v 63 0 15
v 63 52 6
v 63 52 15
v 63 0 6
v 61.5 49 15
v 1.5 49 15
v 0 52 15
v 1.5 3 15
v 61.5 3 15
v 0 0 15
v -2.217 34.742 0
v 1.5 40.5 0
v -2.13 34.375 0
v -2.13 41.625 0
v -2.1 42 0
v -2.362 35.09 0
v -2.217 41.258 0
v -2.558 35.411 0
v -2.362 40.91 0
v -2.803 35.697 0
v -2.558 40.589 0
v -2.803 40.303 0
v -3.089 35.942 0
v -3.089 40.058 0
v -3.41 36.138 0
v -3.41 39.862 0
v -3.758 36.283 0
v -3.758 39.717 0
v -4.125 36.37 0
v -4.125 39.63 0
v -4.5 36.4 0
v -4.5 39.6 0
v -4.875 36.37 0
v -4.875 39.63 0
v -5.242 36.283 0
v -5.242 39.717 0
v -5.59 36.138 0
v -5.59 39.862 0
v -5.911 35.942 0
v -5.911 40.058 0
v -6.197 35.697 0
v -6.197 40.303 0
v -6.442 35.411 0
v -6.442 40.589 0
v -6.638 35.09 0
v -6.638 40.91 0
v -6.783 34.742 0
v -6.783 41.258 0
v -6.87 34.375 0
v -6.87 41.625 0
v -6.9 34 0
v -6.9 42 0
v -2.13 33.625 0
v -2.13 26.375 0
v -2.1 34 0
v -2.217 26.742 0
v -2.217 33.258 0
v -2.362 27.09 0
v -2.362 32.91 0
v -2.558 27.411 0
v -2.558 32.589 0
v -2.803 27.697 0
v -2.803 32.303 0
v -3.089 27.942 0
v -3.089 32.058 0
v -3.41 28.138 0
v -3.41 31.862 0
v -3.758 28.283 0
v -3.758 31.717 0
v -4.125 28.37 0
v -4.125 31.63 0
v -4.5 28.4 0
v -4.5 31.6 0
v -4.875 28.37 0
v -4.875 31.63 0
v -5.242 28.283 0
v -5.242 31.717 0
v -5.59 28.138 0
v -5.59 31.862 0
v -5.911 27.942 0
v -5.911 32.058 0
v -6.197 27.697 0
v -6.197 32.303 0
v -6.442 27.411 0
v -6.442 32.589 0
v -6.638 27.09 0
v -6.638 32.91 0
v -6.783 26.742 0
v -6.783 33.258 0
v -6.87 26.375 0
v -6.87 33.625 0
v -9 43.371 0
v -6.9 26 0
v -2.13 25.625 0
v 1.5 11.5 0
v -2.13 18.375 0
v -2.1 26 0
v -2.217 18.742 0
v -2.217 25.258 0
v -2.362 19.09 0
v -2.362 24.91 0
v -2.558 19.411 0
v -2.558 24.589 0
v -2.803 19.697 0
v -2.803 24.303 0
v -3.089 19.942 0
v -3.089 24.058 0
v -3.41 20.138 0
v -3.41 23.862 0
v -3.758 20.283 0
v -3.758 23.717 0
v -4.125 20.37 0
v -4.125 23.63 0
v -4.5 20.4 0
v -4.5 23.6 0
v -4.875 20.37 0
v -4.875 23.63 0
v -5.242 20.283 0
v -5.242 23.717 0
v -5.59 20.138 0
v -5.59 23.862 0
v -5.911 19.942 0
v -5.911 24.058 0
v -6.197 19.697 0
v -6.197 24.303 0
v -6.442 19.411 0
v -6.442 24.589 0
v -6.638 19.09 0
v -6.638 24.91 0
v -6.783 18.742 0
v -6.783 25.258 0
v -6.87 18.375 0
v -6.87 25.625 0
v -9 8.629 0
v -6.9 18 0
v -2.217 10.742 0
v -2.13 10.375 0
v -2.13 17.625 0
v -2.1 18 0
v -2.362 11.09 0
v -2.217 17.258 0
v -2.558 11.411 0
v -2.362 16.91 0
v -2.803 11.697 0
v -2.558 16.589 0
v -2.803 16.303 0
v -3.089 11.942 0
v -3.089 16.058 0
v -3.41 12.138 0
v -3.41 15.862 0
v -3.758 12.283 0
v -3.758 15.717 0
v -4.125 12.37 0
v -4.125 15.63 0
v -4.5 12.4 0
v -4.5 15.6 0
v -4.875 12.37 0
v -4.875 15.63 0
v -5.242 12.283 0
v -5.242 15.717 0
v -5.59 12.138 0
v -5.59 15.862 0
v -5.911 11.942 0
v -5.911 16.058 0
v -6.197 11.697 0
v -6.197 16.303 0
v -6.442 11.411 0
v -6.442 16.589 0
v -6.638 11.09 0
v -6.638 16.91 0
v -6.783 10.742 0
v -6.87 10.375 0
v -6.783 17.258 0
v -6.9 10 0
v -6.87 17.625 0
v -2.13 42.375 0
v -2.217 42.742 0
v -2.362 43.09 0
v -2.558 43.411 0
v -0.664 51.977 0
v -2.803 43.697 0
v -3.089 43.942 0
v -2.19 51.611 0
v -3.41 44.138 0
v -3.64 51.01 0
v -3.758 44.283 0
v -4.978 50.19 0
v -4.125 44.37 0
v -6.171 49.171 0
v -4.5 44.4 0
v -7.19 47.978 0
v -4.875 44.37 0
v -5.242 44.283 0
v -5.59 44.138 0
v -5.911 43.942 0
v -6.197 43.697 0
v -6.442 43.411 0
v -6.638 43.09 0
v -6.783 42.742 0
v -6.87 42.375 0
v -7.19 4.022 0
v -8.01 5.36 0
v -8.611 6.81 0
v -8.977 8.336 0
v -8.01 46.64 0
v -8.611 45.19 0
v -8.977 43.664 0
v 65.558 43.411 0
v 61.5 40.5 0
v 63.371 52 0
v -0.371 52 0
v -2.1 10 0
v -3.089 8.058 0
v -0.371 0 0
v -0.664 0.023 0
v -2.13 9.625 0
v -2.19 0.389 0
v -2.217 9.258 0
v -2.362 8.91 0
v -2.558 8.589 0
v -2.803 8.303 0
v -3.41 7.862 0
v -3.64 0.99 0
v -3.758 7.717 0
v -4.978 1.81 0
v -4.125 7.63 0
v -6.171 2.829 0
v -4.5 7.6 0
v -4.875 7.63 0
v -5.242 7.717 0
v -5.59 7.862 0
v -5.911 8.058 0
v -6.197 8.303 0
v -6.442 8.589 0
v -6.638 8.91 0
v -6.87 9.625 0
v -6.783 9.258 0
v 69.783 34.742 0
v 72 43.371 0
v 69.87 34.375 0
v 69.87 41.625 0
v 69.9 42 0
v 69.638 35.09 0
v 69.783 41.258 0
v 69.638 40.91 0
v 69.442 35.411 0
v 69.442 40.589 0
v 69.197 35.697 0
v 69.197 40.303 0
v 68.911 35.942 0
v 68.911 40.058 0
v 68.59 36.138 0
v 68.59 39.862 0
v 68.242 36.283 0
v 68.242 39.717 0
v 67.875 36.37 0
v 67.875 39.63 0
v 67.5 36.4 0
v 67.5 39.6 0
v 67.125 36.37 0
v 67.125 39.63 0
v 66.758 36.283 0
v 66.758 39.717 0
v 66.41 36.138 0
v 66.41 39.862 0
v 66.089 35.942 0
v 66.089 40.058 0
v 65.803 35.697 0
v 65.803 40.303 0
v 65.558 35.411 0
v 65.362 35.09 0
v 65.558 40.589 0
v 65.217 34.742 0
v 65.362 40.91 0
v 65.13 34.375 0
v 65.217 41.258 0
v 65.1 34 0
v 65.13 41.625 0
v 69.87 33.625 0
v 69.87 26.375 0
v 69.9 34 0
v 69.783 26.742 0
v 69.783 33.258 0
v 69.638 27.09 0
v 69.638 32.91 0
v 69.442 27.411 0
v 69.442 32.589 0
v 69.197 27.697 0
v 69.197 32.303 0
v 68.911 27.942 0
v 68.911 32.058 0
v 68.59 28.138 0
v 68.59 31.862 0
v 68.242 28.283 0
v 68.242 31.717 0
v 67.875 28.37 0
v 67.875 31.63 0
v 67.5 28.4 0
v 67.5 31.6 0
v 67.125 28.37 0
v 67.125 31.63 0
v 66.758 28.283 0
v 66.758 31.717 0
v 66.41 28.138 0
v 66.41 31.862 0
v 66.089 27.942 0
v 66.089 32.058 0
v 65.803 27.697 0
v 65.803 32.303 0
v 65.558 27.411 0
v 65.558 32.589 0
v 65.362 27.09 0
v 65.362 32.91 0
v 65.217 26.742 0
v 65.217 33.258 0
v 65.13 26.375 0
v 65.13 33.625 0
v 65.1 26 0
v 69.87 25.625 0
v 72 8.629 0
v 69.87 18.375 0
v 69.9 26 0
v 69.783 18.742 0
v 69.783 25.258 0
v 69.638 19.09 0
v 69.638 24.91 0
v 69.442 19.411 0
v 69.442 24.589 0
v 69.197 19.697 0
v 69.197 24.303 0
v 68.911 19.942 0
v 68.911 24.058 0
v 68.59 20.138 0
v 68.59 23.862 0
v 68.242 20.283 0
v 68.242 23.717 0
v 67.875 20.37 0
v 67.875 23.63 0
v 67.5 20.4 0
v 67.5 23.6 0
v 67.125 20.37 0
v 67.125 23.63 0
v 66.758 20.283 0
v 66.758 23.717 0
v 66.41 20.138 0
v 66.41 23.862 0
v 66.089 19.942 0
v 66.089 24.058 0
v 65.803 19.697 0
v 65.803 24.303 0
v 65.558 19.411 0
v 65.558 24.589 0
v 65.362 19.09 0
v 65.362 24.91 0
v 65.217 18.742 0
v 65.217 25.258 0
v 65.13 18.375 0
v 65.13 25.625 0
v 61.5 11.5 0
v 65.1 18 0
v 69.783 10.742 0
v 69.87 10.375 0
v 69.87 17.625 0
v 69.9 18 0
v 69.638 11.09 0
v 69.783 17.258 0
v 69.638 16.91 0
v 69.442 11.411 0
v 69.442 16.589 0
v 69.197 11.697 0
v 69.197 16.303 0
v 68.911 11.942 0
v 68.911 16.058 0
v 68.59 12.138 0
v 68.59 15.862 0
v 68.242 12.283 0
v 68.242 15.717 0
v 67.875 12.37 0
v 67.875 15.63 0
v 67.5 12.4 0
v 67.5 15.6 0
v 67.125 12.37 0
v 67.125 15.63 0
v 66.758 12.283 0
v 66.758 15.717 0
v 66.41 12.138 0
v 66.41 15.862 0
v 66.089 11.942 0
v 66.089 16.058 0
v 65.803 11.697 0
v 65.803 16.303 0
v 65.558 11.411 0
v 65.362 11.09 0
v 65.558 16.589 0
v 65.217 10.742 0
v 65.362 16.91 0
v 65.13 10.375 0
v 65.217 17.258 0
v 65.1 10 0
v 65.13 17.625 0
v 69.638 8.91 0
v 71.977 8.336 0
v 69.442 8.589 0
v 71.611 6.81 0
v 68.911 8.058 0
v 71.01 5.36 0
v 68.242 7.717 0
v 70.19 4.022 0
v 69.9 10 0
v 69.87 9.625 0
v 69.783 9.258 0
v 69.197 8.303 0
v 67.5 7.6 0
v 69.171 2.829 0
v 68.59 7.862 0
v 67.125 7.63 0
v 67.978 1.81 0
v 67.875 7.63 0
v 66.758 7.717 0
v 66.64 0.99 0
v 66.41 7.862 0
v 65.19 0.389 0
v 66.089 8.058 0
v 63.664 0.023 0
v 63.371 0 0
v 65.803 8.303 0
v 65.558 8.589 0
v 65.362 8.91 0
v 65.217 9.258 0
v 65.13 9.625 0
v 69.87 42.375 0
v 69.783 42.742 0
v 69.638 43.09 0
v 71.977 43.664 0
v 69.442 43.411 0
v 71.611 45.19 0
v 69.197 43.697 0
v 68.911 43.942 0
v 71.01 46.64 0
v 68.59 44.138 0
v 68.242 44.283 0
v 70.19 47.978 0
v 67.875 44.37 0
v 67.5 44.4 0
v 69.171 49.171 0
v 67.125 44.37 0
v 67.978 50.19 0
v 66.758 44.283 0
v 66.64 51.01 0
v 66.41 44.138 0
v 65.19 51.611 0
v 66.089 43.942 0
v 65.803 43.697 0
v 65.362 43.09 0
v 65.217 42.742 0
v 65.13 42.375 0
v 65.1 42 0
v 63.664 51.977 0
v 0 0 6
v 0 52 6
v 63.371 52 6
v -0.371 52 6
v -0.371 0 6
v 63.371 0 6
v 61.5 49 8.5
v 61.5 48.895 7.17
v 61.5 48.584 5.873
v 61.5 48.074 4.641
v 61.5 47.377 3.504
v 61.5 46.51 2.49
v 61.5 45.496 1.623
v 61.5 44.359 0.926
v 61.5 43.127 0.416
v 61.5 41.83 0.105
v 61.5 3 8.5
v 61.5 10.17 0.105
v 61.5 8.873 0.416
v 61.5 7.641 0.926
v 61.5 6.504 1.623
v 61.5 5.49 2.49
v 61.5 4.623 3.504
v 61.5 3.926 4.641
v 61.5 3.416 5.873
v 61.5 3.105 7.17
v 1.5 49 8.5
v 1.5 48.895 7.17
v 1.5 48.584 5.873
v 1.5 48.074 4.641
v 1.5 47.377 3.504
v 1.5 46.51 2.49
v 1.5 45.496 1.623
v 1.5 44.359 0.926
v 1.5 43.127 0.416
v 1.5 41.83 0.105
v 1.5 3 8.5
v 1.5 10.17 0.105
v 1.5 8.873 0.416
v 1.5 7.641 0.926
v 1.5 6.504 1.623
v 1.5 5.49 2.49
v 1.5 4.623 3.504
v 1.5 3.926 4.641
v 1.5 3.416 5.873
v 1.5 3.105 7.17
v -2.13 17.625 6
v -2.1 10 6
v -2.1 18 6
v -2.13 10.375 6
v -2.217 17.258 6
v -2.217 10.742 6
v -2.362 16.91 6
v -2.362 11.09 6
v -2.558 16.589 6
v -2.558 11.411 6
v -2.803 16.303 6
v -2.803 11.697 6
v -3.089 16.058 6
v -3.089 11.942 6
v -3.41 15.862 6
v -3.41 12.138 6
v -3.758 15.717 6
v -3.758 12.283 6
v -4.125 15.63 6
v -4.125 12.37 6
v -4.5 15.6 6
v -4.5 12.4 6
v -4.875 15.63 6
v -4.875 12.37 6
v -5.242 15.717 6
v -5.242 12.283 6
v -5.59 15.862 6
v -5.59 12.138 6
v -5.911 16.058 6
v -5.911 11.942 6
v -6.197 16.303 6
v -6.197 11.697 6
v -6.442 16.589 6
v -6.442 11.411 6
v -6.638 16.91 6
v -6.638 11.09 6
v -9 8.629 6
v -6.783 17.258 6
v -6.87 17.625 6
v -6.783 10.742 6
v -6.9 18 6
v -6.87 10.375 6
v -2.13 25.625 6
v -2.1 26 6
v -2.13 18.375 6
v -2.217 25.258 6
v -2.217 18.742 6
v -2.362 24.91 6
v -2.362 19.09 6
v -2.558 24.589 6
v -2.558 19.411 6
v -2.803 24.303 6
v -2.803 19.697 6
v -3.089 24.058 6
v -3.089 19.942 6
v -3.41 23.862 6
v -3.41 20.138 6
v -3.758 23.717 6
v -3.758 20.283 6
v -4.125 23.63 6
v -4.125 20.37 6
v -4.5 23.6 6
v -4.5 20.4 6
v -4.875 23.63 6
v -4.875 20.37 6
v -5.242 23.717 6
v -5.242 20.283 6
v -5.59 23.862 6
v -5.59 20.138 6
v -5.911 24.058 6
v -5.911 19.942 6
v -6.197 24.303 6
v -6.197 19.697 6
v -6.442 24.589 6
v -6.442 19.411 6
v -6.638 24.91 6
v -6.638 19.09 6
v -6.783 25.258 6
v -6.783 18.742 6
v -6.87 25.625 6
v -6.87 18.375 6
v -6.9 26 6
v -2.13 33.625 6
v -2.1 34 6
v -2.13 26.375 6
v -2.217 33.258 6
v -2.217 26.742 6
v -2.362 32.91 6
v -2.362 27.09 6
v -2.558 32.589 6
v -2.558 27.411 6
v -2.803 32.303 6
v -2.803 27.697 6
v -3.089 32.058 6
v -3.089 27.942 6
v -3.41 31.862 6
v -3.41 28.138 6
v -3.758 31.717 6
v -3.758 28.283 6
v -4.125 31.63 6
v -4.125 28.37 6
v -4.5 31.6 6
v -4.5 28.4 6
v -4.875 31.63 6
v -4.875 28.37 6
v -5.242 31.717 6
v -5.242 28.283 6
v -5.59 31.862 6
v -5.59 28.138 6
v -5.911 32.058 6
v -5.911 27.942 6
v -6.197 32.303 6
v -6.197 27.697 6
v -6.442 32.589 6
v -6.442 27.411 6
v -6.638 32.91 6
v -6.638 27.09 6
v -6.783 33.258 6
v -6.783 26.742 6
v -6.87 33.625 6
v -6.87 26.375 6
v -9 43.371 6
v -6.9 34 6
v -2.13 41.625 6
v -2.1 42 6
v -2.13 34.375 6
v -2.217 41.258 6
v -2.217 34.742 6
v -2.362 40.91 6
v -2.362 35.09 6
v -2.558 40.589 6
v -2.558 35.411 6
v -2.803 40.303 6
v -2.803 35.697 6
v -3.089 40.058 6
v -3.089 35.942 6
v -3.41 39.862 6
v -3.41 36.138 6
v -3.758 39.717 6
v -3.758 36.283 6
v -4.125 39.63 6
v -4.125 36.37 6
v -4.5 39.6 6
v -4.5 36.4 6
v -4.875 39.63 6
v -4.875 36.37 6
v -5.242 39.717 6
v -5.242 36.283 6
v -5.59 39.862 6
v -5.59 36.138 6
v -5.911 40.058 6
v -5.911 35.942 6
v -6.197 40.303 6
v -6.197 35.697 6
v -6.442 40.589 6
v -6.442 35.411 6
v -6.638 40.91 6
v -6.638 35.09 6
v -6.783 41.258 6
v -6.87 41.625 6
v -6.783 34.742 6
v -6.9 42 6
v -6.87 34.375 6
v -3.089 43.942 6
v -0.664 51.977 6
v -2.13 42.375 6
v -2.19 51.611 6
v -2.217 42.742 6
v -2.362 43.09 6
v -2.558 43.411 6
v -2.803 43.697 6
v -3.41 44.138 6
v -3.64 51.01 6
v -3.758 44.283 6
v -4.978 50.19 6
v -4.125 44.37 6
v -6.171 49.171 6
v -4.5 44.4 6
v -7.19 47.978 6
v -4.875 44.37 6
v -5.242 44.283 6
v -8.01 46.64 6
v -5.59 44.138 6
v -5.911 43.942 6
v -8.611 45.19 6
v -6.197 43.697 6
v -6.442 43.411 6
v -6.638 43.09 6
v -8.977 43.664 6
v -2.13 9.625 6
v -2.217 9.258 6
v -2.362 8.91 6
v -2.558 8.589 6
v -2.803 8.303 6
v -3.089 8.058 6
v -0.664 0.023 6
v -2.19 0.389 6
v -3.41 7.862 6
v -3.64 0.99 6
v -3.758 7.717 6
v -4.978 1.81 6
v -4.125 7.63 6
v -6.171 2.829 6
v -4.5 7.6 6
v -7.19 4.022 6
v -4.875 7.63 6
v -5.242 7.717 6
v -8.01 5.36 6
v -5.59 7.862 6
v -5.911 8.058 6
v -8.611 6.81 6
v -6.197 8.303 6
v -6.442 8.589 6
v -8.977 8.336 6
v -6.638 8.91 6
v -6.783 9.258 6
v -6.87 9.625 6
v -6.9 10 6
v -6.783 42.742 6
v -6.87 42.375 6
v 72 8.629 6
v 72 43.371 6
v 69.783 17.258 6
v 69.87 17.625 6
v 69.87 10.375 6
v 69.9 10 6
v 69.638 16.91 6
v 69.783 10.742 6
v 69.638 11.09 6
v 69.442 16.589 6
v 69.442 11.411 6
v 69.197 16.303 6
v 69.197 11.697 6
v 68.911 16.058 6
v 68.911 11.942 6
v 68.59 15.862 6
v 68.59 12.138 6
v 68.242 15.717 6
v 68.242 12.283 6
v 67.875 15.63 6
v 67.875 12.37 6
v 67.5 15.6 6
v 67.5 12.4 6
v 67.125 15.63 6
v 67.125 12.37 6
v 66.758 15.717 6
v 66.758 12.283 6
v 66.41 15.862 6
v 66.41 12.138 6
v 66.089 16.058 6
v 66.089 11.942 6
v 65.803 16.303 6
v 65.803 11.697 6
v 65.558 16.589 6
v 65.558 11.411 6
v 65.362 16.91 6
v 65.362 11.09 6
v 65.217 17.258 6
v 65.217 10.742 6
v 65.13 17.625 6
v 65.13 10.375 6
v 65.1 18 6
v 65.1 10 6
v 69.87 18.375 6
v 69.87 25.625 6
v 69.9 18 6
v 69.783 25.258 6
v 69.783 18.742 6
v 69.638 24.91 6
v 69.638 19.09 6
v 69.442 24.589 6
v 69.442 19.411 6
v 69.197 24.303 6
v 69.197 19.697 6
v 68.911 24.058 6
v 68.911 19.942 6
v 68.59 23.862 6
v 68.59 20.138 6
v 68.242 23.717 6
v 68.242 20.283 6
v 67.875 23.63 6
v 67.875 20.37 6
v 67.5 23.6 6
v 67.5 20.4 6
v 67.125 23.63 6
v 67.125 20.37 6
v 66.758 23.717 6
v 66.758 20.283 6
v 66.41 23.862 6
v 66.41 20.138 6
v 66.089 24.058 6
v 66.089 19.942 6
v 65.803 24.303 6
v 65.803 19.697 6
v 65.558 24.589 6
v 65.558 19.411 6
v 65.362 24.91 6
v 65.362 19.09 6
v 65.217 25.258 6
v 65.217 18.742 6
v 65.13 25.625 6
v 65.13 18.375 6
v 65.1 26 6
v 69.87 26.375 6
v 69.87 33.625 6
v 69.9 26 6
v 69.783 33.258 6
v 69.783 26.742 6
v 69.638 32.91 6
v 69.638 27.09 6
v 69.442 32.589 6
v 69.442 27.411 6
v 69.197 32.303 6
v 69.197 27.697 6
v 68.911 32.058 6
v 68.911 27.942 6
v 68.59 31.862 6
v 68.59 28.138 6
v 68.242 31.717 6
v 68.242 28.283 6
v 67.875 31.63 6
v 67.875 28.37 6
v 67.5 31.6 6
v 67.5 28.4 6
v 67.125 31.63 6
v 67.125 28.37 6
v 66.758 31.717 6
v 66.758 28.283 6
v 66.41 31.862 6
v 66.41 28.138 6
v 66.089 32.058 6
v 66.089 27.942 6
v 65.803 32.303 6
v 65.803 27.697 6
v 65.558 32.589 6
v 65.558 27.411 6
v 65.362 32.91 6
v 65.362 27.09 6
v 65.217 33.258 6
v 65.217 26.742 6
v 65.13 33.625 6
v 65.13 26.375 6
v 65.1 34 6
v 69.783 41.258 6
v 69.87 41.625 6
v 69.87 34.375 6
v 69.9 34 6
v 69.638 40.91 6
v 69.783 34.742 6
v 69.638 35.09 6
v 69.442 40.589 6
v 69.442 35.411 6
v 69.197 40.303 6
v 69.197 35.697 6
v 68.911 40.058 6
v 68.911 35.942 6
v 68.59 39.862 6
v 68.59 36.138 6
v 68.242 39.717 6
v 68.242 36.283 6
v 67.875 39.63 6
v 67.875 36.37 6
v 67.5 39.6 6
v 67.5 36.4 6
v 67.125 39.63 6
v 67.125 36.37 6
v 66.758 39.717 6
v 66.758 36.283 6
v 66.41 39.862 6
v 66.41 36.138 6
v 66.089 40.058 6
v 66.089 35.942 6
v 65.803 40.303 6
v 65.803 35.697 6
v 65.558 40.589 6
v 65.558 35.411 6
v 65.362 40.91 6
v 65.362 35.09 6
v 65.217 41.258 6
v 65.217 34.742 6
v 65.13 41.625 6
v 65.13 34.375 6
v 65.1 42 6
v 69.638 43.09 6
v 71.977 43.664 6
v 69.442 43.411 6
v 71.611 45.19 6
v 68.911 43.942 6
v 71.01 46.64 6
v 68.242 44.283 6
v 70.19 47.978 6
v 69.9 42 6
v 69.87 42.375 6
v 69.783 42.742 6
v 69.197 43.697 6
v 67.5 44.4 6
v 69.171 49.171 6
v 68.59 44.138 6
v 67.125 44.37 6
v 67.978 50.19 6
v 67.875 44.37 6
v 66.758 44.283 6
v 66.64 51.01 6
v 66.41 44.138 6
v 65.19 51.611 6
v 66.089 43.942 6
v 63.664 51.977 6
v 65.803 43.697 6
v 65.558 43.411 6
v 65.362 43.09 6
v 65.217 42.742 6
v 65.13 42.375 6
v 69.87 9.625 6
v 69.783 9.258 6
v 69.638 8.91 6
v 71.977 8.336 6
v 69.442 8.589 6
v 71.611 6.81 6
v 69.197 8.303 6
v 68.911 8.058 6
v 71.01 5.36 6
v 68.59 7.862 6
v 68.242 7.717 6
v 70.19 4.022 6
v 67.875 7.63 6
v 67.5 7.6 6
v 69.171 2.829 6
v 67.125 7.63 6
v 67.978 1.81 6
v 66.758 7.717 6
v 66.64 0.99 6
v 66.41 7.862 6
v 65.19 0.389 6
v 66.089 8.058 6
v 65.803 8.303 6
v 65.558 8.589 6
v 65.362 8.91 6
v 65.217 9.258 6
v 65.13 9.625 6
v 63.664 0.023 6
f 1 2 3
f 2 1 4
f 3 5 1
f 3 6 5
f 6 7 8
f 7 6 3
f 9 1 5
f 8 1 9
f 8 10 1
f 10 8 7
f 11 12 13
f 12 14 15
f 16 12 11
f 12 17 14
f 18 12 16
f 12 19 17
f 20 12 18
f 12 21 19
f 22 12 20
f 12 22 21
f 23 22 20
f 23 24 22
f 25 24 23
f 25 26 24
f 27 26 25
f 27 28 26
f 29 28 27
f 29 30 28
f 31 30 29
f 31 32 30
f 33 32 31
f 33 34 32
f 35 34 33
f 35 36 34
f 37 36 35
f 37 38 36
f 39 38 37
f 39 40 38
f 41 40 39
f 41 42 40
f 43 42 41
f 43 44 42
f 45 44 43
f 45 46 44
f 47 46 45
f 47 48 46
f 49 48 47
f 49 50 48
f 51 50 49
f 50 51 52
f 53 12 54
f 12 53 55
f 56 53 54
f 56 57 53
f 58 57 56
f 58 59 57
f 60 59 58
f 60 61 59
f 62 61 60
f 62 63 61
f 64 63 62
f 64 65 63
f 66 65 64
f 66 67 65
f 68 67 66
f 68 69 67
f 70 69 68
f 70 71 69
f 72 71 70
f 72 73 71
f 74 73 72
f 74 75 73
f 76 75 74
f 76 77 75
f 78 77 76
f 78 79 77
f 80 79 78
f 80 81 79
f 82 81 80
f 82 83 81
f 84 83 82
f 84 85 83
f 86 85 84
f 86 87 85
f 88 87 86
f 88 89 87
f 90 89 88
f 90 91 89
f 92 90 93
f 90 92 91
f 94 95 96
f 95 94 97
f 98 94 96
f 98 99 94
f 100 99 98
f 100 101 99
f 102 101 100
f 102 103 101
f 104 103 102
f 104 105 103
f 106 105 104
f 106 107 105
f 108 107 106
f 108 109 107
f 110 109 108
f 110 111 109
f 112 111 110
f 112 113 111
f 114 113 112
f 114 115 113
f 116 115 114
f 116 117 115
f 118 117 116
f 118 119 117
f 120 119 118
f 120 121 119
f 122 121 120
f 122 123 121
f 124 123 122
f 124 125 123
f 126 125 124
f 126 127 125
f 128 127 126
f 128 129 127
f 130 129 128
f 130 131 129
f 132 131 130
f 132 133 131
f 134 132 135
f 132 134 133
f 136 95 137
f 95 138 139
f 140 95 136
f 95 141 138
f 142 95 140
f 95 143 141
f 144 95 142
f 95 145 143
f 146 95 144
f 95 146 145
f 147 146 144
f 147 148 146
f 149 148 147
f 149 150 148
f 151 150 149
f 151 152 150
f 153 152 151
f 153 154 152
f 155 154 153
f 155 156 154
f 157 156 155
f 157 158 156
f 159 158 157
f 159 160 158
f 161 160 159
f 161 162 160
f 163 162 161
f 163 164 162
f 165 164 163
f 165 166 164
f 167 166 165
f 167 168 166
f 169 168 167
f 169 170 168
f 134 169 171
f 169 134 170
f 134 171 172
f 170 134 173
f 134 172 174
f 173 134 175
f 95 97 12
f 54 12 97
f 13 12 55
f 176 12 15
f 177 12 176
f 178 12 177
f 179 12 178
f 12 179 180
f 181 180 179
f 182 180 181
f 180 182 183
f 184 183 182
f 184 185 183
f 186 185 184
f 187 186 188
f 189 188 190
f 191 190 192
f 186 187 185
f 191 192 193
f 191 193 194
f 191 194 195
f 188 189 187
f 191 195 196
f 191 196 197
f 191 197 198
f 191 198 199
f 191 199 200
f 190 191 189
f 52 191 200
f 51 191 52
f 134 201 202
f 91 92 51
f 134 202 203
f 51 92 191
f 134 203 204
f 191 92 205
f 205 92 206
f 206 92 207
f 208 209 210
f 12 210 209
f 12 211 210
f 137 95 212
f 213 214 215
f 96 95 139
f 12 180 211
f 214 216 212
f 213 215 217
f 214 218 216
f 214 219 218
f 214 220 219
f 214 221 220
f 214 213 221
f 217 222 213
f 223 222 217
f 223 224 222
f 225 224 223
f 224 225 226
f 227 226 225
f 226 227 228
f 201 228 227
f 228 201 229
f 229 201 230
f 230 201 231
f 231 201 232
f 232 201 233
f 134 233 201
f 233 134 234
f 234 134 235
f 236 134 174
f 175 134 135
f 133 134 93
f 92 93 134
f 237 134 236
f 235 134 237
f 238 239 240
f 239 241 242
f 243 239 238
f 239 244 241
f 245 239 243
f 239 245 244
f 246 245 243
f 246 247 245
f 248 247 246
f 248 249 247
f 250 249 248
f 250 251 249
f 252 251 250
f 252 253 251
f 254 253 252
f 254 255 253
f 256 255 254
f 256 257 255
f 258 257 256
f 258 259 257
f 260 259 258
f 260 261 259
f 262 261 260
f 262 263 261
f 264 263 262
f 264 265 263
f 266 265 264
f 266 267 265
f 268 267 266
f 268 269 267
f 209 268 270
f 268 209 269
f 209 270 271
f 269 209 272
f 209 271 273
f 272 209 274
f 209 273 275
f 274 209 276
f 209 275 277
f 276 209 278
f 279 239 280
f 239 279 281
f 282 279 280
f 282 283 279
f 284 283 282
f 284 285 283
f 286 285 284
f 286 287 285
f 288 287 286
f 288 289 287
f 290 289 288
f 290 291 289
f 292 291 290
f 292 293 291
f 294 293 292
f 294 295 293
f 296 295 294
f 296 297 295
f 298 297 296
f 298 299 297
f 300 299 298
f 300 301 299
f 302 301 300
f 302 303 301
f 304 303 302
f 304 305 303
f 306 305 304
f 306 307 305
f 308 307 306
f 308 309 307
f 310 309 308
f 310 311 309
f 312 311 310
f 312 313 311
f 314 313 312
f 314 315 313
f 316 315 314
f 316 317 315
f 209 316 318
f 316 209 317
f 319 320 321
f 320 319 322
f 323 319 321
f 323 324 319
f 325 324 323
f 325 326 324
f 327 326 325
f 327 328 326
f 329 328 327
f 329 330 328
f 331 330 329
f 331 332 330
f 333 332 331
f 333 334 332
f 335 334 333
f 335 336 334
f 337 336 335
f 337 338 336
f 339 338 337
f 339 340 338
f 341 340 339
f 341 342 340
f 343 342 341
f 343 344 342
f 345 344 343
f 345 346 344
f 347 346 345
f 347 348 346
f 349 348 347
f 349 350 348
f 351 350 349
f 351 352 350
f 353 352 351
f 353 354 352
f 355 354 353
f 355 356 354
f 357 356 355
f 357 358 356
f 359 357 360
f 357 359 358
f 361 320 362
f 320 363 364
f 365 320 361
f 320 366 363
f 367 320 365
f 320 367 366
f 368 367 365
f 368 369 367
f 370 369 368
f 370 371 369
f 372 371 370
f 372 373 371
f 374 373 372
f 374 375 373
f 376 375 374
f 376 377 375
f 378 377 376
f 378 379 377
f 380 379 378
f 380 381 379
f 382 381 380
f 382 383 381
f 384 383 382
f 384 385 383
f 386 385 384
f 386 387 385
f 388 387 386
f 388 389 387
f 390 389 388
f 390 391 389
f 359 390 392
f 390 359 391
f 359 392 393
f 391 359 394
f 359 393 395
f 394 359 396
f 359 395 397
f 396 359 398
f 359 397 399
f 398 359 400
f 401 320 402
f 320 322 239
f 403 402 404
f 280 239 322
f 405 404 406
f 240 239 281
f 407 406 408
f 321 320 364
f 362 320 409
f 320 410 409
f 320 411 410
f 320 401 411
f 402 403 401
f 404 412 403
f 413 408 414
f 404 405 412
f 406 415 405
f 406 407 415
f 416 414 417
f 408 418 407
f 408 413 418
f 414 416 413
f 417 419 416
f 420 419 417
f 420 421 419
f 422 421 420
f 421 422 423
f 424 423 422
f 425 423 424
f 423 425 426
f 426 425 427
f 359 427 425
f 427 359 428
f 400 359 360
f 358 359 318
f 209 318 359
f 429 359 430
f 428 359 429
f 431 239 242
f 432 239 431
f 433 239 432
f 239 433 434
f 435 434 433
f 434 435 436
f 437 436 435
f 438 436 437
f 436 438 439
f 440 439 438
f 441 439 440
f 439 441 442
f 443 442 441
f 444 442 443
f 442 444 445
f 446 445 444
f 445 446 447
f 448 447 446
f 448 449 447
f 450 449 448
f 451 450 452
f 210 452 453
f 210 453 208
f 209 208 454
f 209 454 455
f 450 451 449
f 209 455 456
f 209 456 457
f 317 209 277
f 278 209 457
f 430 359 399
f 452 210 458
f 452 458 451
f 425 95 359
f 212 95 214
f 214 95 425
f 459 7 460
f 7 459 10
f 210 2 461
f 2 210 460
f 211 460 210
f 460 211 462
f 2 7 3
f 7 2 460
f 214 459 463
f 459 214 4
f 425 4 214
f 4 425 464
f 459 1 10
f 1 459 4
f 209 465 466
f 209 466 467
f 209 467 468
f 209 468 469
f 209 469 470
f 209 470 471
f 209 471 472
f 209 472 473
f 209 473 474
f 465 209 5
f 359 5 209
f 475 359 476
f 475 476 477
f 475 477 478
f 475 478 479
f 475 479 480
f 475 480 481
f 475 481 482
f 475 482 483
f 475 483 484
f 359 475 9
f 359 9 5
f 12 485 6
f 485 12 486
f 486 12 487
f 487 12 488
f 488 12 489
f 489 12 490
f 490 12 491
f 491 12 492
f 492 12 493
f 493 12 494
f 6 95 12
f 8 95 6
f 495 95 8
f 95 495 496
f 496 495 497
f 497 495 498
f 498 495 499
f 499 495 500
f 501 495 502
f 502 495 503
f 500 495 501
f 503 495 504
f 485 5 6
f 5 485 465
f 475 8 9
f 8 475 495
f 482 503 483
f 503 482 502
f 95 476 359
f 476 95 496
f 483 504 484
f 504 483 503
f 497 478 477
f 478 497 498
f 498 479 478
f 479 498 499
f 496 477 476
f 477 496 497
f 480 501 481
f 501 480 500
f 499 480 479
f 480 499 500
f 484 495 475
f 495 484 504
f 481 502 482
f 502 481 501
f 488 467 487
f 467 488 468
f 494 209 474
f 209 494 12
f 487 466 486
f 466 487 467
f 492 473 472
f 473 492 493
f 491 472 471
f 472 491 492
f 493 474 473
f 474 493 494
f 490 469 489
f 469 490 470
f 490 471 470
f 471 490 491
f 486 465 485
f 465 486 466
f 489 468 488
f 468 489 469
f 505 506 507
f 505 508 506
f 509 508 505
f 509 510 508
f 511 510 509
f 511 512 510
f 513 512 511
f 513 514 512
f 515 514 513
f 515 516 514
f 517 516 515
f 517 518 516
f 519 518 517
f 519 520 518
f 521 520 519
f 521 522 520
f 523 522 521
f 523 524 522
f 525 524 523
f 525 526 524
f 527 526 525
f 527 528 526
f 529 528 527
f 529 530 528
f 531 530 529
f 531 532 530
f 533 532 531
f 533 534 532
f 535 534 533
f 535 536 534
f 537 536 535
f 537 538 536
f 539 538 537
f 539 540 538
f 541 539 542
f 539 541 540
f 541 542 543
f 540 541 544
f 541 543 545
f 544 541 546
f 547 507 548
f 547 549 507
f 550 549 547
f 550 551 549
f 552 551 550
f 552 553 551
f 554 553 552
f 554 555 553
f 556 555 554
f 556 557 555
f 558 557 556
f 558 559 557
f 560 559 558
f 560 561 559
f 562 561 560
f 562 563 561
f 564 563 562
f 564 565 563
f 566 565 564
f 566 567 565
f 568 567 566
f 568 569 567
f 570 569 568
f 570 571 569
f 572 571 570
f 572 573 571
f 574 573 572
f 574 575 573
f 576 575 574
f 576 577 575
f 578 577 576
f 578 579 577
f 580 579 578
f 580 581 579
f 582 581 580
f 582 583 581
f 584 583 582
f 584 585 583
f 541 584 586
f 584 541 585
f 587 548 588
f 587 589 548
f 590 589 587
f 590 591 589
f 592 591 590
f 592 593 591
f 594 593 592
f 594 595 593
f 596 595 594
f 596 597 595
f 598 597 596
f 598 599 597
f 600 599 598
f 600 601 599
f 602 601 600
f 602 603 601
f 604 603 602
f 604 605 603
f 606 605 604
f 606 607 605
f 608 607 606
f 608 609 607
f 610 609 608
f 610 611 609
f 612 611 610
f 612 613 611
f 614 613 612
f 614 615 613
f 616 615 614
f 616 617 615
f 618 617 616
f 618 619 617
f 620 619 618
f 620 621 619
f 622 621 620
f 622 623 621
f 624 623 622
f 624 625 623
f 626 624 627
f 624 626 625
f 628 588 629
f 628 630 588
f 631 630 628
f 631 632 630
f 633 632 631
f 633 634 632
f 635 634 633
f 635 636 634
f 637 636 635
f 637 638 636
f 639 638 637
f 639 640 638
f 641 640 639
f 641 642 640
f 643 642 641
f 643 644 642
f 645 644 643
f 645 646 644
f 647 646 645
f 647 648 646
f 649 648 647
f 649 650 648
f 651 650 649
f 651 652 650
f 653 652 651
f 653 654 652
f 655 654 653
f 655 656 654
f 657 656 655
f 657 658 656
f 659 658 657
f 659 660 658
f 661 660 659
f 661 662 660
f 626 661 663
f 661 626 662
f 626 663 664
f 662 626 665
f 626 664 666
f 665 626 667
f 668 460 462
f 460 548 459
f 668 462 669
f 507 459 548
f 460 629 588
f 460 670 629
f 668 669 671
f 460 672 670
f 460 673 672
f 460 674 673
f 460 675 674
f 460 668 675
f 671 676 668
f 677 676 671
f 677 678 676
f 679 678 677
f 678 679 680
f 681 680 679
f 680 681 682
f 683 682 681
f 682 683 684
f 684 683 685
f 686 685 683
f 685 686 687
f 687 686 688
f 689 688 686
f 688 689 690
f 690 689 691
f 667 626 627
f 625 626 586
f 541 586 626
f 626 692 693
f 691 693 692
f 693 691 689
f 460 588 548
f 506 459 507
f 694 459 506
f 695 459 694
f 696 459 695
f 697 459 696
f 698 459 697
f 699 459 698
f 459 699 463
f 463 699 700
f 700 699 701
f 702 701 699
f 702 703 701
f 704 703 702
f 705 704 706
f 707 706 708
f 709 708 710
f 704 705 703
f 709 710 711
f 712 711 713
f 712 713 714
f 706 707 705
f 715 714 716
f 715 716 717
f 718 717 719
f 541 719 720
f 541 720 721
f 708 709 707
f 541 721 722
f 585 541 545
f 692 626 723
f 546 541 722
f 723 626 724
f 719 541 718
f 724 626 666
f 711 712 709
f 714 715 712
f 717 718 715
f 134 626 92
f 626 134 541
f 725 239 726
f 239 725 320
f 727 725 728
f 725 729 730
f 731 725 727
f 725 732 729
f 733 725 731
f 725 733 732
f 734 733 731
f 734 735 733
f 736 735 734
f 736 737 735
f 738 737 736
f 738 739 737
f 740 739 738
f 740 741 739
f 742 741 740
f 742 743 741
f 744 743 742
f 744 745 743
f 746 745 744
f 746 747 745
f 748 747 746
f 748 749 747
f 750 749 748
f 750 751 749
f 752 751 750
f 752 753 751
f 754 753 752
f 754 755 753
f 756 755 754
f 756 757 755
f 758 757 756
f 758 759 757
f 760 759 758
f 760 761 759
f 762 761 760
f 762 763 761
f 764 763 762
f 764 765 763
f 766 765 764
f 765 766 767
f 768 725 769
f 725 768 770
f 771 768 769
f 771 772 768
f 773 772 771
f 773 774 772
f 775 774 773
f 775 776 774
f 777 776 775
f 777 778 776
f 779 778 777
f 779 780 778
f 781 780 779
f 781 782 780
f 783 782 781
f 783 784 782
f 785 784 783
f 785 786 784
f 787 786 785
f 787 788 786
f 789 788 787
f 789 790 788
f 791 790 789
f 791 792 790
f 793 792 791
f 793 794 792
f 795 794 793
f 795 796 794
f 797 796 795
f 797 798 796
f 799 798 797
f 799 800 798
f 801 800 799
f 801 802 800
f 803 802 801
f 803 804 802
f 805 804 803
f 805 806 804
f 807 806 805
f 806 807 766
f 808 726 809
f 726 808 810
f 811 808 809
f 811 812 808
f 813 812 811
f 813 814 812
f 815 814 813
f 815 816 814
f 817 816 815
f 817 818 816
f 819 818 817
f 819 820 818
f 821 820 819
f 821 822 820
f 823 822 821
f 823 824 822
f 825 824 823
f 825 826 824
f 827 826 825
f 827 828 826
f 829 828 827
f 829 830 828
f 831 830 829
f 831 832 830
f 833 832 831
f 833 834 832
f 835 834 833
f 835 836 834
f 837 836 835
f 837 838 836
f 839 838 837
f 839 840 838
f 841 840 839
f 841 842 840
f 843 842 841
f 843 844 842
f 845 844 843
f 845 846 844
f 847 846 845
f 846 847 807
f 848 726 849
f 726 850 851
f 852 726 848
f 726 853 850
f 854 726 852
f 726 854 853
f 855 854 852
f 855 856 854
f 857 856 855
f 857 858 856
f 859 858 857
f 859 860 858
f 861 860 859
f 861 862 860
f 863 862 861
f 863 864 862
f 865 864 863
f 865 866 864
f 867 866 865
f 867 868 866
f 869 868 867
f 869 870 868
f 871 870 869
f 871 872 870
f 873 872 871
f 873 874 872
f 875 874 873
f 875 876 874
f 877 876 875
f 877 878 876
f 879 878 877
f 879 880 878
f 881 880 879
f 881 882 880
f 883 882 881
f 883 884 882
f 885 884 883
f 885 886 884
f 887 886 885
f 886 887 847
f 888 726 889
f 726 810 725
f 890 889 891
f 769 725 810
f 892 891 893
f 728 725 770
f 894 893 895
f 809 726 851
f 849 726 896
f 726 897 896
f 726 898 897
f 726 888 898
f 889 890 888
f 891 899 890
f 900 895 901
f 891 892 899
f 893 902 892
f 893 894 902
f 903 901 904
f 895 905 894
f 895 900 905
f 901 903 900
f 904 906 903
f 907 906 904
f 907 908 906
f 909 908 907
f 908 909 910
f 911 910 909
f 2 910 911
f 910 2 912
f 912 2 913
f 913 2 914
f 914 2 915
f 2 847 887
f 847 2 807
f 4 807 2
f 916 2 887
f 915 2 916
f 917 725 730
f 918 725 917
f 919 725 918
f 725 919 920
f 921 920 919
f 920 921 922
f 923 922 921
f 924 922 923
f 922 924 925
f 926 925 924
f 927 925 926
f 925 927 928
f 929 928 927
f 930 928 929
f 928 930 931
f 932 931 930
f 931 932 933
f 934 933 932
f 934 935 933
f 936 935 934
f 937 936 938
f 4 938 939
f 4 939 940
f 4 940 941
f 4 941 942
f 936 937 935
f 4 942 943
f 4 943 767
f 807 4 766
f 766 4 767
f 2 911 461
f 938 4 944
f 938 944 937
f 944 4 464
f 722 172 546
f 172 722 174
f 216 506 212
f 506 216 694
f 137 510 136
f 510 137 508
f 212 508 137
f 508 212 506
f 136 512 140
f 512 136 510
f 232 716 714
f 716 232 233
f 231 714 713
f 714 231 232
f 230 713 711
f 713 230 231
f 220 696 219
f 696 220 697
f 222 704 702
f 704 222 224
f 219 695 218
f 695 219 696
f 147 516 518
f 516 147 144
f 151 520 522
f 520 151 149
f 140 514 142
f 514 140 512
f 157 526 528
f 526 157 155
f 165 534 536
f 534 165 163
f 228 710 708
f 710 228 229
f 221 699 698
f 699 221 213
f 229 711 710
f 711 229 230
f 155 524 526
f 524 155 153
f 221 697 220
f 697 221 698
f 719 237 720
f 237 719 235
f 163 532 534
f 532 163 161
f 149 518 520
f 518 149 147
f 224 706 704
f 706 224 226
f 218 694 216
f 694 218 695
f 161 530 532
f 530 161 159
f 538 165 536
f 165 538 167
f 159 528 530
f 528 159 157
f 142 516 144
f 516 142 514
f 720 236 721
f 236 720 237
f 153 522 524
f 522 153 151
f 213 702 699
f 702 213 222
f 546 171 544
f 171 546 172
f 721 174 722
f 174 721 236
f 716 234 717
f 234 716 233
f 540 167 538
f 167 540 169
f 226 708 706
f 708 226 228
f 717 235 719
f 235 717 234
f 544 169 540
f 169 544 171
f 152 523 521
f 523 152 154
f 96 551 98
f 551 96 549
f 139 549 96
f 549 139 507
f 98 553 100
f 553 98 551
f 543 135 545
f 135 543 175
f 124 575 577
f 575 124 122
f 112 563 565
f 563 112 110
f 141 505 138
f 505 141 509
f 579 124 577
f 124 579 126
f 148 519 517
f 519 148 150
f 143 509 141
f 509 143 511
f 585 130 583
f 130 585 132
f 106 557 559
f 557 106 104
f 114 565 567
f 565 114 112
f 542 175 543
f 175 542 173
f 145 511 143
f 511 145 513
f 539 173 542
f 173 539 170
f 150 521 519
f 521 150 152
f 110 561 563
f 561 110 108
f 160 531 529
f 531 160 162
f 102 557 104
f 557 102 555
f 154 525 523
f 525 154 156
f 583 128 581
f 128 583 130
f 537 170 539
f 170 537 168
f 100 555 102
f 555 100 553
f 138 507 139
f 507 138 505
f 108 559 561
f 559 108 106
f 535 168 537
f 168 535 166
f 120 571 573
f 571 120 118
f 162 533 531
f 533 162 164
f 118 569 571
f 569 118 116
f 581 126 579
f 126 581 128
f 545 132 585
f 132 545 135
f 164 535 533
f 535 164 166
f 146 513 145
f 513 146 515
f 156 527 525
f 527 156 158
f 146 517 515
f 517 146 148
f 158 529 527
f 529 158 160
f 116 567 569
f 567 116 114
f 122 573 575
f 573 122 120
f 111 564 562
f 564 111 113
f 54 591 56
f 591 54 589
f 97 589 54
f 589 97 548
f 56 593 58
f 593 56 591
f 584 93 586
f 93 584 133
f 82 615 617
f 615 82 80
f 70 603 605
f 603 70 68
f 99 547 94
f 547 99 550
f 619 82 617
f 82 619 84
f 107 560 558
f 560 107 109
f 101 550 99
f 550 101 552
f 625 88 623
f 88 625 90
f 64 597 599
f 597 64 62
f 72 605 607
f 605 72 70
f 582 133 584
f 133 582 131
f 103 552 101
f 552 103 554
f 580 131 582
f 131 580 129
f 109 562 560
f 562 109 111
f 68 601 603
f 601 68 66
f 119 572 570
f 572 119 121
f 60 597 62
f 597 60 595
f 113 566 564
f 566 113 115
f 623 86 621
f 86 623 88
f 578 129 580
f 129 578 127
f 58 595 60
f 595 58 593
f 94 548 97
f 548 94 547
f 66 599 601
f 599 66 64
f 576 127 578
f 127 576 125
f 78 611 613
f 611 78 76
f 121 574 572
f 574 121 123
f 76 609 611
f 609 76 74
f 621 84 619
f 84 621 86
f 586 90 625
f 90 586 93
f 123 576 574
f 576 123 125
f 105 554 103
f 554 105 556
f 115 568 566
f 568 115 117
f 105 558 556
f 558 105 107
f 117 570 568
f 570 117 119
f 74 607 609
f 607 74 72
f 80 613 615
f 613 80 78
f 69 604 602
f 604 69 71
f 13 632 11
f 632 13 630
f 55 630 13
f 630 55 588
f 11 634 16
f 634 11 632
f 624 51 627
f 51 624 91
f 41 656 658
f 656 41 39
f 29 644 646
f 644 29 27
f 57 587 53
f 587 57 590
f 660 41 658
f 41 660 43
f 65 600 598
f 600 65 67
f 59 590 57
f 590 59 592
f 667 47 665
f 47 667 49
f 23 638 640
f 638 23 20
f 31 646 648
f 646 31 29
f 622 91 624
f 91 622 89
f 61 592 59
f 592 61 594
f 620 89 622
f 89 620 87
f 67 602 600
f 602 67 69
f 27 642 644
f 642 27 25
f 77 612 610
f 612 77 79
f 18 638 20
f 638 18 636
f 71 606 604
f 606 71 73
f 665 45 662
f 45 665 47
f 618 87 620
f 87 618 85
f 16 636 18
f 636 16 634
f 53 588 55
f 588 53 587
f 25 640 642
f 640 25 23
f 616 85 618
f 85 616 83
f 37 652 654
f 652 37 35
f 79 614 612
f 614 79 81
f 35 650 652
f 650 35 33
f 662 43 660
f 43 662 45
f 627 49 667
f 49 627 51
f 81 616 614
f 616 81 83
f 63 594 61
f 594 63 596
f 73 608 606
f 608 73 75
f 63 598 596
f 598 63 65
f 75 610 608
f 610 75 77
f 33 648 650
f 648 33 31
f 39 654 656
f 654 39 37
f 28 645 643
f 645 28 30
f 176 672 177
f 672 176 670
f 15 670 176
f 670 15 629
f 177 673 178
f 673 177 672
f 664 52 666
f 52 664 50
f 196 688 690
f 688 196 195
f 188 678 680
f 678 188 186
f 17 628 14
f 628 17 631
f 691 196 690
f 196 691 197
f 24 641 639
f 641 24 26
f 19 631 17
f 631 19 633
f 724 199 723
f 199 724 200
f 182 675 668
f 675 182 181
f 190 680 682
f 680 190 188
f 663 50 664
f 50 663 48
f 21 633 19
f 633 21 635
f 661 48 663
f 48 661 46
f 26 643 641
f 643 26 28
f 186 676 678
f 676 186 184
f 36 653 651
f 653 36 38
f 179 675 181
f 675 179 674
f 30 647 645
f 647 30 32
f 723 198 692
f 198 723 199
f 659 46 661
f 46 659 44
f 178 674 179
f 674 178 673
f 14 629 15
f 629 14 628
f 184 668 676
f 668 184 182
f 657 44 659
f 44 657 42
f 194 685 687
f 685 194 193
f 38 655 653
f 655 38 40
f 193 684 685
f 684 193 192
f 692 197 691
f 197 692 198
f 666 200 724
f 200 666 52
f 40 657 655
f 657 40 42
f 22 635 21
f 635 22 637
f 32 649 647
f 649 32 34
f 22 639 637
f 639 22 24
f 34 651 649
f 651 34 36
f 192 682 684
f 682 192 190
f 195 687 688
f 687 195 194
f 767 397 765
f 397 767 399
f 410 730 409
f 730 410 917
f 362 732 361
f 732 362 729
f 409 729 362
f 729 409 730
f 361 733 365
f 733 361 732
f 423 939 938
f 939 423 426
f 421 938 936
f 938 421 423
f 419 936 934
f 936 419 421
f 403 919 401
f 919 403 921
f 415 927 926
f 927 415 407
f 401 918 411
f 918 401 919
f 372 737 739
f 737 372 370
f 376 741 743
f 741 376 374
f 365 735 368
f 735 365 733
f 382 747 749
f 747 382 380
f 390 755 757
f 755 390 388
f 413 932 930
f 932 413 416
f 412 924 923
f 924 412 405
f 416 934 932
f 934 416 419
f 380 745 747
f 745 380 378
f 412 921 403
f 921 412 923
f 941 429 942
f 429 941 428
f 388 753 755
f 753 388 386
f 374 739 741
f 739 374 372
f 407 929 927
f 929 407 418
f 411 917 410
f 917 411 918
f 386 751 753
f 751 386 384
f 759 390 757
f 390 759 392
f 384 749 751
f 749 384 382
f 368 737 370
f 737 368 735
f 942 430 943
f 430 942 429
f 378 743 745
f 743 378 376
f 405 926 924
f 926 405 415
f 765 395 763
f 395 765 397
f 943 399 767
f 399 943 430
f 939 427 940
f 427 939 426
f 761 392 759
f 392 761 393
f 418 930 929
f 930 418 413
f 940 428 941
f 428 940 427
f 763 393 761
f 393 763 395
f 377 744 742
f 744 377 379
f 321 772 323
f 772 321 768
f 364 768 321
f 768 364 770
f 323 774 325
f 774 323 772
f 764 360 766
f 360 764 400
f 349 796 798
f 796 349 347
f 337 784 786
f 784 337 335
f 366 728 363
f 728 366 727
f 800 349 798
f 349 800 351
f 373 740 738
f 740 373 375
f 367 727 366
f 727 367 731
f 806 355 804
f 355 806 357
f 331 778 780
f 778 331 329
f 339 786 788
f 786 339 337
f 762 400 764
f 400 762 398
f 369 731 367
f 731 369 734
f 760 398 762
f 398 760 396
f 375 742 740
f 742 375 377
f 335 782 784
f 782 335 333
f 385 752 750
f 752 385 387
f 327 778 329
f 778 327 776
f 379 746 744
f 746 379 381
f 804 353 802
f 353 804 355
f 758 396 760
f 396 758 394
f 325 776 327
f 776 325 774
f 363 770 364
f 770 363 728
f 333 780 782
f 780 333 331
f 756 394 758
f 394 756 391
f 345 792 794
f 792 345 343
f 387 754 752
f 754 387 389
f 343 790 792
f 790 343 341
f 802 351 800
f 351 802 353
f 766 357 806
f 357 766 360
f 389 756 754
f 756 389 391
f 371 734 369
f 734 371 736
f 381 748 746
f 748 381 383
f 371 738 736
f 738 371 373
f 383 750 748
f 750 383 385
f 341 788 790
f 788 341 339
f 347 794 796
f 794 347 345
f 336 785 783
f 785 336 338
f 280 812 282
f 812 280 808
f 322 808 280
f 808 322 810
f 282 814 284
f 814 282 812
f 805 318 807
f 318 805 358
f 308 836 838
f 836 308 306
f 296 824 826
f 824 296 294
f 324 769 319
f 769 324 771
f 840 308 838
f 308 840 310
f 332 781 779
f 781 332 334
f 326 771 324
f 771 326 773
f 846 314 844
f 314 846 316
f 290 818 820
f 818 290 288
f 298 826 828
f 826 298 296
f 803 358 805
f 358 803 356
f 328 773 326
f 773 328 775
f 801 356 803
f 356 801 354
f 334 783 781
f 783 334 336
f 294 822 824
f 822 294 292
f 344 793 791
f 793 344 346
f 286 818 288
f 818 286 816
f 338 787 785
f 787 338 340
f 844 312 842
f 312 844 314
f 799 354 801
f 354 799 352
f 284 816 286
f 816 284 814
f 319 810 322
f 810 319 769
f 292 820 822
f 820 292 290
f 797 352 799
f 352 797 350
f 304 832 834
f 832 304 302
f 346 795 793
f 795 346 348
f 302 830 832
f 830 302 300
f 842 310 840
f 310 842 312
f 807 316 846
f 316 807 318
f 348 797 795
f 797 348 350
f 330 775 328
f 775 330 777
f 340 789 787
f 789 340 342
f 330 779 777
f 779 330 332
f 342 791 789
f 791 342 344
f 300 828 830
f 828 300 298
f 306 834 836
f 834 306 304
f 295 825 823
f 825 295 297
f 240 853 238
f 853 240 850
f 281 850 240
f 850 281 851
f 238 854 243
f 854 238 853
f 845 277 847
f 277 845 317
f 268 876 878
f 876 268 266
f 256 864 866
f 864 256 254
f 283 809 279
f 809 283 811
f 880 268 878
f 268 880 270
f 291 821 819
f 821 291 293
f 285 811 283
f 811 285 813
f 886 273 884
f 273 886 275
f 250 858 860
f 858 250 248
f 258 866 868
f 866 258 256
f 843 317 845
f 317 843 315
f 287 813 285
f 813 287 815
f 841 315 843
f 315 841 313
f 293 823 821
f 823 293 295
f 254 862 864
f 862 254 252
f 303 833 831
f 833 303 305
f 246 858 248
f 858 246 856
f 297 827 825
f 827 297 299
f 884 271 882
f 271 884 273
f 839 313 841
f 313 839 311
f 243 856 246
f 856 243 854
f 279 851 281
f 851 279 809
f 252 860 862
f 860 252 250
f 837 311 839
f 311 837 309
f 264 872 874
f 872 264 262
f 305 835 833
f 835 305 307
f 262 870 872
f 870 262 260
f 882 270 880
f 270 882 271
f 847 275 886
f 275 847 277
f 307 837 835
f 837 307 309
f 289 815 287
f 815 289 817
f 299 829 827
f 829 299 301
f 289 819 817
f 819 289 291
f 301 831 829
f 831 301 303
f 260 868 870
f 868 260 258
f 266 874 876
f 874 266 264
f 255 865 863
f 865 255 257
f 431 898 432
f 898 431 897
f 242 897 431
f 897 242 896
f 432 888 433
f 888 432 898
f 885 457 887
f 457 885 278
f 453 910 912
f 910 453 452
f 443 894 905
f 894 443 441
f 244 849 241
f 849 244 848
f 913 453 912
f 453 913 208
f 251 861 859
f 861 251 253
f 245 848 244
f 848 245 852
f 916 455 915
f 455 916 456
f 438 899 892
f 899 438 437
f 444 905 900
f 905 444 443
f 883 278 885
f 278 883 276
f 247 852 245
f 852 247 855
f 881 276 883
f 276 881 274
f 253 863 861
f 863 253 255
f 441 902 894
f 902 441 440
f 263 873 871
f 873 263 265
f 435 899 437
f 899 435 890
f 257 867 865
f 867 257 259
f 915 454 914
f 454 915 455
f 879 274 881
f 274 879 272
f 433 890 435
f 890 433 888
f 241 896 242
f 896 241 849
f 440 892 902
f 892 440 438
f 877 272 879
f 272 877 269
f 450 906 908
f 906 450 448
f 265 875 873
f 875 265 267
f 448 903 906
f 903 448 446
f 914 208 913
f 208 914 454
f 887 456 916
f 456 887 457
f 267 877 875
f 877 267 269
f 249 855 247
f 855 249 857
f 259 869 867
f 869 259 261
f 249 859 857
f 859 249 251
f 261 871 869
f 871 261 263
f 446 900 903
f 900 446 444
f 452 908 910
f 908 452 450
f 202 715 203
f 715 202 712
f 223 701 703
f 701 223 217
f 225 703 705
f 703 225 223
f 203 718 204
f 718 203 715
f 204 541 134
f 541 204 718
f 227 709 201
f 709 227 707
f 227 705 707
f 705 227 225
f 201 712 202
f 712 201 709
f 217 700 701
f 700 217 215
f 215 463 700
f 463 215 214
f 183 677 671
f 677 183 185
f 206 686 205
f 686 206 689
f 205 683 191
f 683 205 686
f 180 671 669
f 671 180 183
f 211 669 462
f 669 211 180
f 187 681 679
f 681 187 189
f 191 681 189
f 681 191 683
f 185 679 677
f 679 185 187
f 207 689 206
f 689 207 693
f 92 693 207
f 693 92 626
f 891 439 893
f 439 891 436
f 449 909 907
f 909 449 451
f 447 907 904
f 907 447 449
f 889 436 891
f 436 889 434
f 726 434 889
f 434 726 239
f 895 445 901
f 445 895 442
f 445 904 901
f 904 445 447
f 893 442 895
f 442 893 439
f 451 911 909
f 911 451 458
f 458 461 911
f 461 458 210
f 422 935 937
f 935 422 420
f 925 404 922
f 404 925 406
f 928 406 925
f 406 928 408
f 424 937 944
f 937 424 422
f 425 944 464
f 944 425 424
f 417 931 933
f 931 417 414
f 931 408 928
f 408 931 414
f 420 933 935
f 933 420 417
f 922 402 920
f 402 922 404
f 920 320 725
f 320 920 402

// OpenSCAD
// holder inner length (X axis)
HOLDER_L = 60;

// holder inner width (Y axis)
HOLDER_W = 46;

// holder height
HOLDER_H = 15;

THICKNESS_W = 3;
THICKNESS_L = 1.5;

// LEGO part height
LEGO_HEIGHT = 6;

// LEGO part length
LEGO_L = 9;

// width/radius of support
SUPPORT_WIDTH = 8.5;

CORNER_RADIUS = 10;

$fn = 40;

// calc
TOTAL_WIDTH = HOLDER_W + THICKNESS_W * 2;
TOTAL_LENGTH = HOLDER_L + THICKNESS_L * 2;

module SUPPORT_ONE()
{
	difference(){
		cube([HOLDER_L, SUPPORT_WIDTH, SUPPORT_WIDTH]);

		translate([-1, SUPPORT_WIDTH, SUPPORT_WIDTH])
			rotate([0, 90, 0])
				cylinder(r=SUPPORT_WIDTH, h=HOLDER_L+2);
	}
}

module SUPPORT()
{
	translate([THICKNESS_L, THICKNESS_W, 0])
		SUPPORT_ONE();

	translate([THICKNESS_L + HOLDER_L, THICKNESS_W + HOLDER_W, 0])
		rotate([0, 0, 180])
		SUPPORT_ONE();
}

module BASE()
{
	difference()
	{
		cube([HOLDER_L + THICKNESS_L * 2, HOLDER_W + THICKNESS_W * 2, HOLDER_H]);
		translate([THICKNESS_L, THICKNESS_W, -2])
			cube([HOLDER_L, HOLDER_W, HOLDER_H + 3]);
	}
}

STEP = 8;
DIAM_LEGO = 4.8;
module GEN_LEGO_HOLES(cnt)
{
	for (x = [0: STEP: STEP * (cnt - 1)])
	{
		translate([0, x, -2])
			cylinder(h = 20, r = DIAM_LEGO / 2);
	}
}

module LEGO_HANDLE_ONE()
{
	cube([LEGO_L, HOLDER_W + THICKNESS_W * 2, LEGO_HEIGHT]);
}

module LEGO_HANDLES_WO_HOLES()
{
	translate([-LEGO_L, 0, 0])
		LEGO_HANDLE_ONE();
	translate([HOLDER_L + THICKNESS_L * 2, 0, 0])
		LEGO_HANDLE_ONE();
}

module LEGO_HANDLES()
{
	difference()
	{
		LEGO_HANDLES_WO_HOLES();
		
		HOLES_CNT = 5;
		HOLES_DIFF = 9;
		
		OFFSET_X = -7+2.5;
		OFFSET_Y = (HOLDER_W + THICKNESS_W * 2) / 2 - ((HOLES_CNT-1) * STEP) / 2;
		
		translate([OFFSET_X, OFFSET_Y, 0])
			GEN_LEGO_HOLES(HOLES_CNT);
		
		translate([OFFSET_X + HOLES_DIFF * STEP, OFFSET_Y, 0])
			GEN_LEGO_HOLES(HOLES_CNT);
	}
}

module OUTPUT_SQUARE_CORNER()
{
	BASE();
	SUPPORT();
	LEGO_HANDLES();
}

module CUTTER()
{
	difference()
	{
		cube([CORNER_RADIUS, CORNER_RADIUS, 35]);
		
		translate([CORNER_RADIUS, CORNER_RADIUS, -2])
		cylinder(r=CORNER_RADIUS, h=40);
	}
}
module OUTPUT_ROUNDED_CORNER()
{
	difference()
	{
		OUTPUT_SQUARE_CORNER();
		
		OFF = 0.1;
		translate([-LEGO_L - OFF, -OFF, -5])
			CUTTER();	
		translate([-LEGO_L - OFF, TOTAL_WIDTH + OFF, -5])
			rotate([0, 0, -90])
				CUTTER();
		translate([TOTAL_LENGTH + LEGO_L + OFF, TOTAL_WIDTH + OFF, -5])
			rotate([0, 0, 180])
				CUTTER();
		translate([TOTAL_LENGTH + LEGO_L + OFF, -OFF, -5])
			rotate([0, 0, 90])
				CUTTER();
	}
}

OUTPUT_ROUNDED_CORNER();
